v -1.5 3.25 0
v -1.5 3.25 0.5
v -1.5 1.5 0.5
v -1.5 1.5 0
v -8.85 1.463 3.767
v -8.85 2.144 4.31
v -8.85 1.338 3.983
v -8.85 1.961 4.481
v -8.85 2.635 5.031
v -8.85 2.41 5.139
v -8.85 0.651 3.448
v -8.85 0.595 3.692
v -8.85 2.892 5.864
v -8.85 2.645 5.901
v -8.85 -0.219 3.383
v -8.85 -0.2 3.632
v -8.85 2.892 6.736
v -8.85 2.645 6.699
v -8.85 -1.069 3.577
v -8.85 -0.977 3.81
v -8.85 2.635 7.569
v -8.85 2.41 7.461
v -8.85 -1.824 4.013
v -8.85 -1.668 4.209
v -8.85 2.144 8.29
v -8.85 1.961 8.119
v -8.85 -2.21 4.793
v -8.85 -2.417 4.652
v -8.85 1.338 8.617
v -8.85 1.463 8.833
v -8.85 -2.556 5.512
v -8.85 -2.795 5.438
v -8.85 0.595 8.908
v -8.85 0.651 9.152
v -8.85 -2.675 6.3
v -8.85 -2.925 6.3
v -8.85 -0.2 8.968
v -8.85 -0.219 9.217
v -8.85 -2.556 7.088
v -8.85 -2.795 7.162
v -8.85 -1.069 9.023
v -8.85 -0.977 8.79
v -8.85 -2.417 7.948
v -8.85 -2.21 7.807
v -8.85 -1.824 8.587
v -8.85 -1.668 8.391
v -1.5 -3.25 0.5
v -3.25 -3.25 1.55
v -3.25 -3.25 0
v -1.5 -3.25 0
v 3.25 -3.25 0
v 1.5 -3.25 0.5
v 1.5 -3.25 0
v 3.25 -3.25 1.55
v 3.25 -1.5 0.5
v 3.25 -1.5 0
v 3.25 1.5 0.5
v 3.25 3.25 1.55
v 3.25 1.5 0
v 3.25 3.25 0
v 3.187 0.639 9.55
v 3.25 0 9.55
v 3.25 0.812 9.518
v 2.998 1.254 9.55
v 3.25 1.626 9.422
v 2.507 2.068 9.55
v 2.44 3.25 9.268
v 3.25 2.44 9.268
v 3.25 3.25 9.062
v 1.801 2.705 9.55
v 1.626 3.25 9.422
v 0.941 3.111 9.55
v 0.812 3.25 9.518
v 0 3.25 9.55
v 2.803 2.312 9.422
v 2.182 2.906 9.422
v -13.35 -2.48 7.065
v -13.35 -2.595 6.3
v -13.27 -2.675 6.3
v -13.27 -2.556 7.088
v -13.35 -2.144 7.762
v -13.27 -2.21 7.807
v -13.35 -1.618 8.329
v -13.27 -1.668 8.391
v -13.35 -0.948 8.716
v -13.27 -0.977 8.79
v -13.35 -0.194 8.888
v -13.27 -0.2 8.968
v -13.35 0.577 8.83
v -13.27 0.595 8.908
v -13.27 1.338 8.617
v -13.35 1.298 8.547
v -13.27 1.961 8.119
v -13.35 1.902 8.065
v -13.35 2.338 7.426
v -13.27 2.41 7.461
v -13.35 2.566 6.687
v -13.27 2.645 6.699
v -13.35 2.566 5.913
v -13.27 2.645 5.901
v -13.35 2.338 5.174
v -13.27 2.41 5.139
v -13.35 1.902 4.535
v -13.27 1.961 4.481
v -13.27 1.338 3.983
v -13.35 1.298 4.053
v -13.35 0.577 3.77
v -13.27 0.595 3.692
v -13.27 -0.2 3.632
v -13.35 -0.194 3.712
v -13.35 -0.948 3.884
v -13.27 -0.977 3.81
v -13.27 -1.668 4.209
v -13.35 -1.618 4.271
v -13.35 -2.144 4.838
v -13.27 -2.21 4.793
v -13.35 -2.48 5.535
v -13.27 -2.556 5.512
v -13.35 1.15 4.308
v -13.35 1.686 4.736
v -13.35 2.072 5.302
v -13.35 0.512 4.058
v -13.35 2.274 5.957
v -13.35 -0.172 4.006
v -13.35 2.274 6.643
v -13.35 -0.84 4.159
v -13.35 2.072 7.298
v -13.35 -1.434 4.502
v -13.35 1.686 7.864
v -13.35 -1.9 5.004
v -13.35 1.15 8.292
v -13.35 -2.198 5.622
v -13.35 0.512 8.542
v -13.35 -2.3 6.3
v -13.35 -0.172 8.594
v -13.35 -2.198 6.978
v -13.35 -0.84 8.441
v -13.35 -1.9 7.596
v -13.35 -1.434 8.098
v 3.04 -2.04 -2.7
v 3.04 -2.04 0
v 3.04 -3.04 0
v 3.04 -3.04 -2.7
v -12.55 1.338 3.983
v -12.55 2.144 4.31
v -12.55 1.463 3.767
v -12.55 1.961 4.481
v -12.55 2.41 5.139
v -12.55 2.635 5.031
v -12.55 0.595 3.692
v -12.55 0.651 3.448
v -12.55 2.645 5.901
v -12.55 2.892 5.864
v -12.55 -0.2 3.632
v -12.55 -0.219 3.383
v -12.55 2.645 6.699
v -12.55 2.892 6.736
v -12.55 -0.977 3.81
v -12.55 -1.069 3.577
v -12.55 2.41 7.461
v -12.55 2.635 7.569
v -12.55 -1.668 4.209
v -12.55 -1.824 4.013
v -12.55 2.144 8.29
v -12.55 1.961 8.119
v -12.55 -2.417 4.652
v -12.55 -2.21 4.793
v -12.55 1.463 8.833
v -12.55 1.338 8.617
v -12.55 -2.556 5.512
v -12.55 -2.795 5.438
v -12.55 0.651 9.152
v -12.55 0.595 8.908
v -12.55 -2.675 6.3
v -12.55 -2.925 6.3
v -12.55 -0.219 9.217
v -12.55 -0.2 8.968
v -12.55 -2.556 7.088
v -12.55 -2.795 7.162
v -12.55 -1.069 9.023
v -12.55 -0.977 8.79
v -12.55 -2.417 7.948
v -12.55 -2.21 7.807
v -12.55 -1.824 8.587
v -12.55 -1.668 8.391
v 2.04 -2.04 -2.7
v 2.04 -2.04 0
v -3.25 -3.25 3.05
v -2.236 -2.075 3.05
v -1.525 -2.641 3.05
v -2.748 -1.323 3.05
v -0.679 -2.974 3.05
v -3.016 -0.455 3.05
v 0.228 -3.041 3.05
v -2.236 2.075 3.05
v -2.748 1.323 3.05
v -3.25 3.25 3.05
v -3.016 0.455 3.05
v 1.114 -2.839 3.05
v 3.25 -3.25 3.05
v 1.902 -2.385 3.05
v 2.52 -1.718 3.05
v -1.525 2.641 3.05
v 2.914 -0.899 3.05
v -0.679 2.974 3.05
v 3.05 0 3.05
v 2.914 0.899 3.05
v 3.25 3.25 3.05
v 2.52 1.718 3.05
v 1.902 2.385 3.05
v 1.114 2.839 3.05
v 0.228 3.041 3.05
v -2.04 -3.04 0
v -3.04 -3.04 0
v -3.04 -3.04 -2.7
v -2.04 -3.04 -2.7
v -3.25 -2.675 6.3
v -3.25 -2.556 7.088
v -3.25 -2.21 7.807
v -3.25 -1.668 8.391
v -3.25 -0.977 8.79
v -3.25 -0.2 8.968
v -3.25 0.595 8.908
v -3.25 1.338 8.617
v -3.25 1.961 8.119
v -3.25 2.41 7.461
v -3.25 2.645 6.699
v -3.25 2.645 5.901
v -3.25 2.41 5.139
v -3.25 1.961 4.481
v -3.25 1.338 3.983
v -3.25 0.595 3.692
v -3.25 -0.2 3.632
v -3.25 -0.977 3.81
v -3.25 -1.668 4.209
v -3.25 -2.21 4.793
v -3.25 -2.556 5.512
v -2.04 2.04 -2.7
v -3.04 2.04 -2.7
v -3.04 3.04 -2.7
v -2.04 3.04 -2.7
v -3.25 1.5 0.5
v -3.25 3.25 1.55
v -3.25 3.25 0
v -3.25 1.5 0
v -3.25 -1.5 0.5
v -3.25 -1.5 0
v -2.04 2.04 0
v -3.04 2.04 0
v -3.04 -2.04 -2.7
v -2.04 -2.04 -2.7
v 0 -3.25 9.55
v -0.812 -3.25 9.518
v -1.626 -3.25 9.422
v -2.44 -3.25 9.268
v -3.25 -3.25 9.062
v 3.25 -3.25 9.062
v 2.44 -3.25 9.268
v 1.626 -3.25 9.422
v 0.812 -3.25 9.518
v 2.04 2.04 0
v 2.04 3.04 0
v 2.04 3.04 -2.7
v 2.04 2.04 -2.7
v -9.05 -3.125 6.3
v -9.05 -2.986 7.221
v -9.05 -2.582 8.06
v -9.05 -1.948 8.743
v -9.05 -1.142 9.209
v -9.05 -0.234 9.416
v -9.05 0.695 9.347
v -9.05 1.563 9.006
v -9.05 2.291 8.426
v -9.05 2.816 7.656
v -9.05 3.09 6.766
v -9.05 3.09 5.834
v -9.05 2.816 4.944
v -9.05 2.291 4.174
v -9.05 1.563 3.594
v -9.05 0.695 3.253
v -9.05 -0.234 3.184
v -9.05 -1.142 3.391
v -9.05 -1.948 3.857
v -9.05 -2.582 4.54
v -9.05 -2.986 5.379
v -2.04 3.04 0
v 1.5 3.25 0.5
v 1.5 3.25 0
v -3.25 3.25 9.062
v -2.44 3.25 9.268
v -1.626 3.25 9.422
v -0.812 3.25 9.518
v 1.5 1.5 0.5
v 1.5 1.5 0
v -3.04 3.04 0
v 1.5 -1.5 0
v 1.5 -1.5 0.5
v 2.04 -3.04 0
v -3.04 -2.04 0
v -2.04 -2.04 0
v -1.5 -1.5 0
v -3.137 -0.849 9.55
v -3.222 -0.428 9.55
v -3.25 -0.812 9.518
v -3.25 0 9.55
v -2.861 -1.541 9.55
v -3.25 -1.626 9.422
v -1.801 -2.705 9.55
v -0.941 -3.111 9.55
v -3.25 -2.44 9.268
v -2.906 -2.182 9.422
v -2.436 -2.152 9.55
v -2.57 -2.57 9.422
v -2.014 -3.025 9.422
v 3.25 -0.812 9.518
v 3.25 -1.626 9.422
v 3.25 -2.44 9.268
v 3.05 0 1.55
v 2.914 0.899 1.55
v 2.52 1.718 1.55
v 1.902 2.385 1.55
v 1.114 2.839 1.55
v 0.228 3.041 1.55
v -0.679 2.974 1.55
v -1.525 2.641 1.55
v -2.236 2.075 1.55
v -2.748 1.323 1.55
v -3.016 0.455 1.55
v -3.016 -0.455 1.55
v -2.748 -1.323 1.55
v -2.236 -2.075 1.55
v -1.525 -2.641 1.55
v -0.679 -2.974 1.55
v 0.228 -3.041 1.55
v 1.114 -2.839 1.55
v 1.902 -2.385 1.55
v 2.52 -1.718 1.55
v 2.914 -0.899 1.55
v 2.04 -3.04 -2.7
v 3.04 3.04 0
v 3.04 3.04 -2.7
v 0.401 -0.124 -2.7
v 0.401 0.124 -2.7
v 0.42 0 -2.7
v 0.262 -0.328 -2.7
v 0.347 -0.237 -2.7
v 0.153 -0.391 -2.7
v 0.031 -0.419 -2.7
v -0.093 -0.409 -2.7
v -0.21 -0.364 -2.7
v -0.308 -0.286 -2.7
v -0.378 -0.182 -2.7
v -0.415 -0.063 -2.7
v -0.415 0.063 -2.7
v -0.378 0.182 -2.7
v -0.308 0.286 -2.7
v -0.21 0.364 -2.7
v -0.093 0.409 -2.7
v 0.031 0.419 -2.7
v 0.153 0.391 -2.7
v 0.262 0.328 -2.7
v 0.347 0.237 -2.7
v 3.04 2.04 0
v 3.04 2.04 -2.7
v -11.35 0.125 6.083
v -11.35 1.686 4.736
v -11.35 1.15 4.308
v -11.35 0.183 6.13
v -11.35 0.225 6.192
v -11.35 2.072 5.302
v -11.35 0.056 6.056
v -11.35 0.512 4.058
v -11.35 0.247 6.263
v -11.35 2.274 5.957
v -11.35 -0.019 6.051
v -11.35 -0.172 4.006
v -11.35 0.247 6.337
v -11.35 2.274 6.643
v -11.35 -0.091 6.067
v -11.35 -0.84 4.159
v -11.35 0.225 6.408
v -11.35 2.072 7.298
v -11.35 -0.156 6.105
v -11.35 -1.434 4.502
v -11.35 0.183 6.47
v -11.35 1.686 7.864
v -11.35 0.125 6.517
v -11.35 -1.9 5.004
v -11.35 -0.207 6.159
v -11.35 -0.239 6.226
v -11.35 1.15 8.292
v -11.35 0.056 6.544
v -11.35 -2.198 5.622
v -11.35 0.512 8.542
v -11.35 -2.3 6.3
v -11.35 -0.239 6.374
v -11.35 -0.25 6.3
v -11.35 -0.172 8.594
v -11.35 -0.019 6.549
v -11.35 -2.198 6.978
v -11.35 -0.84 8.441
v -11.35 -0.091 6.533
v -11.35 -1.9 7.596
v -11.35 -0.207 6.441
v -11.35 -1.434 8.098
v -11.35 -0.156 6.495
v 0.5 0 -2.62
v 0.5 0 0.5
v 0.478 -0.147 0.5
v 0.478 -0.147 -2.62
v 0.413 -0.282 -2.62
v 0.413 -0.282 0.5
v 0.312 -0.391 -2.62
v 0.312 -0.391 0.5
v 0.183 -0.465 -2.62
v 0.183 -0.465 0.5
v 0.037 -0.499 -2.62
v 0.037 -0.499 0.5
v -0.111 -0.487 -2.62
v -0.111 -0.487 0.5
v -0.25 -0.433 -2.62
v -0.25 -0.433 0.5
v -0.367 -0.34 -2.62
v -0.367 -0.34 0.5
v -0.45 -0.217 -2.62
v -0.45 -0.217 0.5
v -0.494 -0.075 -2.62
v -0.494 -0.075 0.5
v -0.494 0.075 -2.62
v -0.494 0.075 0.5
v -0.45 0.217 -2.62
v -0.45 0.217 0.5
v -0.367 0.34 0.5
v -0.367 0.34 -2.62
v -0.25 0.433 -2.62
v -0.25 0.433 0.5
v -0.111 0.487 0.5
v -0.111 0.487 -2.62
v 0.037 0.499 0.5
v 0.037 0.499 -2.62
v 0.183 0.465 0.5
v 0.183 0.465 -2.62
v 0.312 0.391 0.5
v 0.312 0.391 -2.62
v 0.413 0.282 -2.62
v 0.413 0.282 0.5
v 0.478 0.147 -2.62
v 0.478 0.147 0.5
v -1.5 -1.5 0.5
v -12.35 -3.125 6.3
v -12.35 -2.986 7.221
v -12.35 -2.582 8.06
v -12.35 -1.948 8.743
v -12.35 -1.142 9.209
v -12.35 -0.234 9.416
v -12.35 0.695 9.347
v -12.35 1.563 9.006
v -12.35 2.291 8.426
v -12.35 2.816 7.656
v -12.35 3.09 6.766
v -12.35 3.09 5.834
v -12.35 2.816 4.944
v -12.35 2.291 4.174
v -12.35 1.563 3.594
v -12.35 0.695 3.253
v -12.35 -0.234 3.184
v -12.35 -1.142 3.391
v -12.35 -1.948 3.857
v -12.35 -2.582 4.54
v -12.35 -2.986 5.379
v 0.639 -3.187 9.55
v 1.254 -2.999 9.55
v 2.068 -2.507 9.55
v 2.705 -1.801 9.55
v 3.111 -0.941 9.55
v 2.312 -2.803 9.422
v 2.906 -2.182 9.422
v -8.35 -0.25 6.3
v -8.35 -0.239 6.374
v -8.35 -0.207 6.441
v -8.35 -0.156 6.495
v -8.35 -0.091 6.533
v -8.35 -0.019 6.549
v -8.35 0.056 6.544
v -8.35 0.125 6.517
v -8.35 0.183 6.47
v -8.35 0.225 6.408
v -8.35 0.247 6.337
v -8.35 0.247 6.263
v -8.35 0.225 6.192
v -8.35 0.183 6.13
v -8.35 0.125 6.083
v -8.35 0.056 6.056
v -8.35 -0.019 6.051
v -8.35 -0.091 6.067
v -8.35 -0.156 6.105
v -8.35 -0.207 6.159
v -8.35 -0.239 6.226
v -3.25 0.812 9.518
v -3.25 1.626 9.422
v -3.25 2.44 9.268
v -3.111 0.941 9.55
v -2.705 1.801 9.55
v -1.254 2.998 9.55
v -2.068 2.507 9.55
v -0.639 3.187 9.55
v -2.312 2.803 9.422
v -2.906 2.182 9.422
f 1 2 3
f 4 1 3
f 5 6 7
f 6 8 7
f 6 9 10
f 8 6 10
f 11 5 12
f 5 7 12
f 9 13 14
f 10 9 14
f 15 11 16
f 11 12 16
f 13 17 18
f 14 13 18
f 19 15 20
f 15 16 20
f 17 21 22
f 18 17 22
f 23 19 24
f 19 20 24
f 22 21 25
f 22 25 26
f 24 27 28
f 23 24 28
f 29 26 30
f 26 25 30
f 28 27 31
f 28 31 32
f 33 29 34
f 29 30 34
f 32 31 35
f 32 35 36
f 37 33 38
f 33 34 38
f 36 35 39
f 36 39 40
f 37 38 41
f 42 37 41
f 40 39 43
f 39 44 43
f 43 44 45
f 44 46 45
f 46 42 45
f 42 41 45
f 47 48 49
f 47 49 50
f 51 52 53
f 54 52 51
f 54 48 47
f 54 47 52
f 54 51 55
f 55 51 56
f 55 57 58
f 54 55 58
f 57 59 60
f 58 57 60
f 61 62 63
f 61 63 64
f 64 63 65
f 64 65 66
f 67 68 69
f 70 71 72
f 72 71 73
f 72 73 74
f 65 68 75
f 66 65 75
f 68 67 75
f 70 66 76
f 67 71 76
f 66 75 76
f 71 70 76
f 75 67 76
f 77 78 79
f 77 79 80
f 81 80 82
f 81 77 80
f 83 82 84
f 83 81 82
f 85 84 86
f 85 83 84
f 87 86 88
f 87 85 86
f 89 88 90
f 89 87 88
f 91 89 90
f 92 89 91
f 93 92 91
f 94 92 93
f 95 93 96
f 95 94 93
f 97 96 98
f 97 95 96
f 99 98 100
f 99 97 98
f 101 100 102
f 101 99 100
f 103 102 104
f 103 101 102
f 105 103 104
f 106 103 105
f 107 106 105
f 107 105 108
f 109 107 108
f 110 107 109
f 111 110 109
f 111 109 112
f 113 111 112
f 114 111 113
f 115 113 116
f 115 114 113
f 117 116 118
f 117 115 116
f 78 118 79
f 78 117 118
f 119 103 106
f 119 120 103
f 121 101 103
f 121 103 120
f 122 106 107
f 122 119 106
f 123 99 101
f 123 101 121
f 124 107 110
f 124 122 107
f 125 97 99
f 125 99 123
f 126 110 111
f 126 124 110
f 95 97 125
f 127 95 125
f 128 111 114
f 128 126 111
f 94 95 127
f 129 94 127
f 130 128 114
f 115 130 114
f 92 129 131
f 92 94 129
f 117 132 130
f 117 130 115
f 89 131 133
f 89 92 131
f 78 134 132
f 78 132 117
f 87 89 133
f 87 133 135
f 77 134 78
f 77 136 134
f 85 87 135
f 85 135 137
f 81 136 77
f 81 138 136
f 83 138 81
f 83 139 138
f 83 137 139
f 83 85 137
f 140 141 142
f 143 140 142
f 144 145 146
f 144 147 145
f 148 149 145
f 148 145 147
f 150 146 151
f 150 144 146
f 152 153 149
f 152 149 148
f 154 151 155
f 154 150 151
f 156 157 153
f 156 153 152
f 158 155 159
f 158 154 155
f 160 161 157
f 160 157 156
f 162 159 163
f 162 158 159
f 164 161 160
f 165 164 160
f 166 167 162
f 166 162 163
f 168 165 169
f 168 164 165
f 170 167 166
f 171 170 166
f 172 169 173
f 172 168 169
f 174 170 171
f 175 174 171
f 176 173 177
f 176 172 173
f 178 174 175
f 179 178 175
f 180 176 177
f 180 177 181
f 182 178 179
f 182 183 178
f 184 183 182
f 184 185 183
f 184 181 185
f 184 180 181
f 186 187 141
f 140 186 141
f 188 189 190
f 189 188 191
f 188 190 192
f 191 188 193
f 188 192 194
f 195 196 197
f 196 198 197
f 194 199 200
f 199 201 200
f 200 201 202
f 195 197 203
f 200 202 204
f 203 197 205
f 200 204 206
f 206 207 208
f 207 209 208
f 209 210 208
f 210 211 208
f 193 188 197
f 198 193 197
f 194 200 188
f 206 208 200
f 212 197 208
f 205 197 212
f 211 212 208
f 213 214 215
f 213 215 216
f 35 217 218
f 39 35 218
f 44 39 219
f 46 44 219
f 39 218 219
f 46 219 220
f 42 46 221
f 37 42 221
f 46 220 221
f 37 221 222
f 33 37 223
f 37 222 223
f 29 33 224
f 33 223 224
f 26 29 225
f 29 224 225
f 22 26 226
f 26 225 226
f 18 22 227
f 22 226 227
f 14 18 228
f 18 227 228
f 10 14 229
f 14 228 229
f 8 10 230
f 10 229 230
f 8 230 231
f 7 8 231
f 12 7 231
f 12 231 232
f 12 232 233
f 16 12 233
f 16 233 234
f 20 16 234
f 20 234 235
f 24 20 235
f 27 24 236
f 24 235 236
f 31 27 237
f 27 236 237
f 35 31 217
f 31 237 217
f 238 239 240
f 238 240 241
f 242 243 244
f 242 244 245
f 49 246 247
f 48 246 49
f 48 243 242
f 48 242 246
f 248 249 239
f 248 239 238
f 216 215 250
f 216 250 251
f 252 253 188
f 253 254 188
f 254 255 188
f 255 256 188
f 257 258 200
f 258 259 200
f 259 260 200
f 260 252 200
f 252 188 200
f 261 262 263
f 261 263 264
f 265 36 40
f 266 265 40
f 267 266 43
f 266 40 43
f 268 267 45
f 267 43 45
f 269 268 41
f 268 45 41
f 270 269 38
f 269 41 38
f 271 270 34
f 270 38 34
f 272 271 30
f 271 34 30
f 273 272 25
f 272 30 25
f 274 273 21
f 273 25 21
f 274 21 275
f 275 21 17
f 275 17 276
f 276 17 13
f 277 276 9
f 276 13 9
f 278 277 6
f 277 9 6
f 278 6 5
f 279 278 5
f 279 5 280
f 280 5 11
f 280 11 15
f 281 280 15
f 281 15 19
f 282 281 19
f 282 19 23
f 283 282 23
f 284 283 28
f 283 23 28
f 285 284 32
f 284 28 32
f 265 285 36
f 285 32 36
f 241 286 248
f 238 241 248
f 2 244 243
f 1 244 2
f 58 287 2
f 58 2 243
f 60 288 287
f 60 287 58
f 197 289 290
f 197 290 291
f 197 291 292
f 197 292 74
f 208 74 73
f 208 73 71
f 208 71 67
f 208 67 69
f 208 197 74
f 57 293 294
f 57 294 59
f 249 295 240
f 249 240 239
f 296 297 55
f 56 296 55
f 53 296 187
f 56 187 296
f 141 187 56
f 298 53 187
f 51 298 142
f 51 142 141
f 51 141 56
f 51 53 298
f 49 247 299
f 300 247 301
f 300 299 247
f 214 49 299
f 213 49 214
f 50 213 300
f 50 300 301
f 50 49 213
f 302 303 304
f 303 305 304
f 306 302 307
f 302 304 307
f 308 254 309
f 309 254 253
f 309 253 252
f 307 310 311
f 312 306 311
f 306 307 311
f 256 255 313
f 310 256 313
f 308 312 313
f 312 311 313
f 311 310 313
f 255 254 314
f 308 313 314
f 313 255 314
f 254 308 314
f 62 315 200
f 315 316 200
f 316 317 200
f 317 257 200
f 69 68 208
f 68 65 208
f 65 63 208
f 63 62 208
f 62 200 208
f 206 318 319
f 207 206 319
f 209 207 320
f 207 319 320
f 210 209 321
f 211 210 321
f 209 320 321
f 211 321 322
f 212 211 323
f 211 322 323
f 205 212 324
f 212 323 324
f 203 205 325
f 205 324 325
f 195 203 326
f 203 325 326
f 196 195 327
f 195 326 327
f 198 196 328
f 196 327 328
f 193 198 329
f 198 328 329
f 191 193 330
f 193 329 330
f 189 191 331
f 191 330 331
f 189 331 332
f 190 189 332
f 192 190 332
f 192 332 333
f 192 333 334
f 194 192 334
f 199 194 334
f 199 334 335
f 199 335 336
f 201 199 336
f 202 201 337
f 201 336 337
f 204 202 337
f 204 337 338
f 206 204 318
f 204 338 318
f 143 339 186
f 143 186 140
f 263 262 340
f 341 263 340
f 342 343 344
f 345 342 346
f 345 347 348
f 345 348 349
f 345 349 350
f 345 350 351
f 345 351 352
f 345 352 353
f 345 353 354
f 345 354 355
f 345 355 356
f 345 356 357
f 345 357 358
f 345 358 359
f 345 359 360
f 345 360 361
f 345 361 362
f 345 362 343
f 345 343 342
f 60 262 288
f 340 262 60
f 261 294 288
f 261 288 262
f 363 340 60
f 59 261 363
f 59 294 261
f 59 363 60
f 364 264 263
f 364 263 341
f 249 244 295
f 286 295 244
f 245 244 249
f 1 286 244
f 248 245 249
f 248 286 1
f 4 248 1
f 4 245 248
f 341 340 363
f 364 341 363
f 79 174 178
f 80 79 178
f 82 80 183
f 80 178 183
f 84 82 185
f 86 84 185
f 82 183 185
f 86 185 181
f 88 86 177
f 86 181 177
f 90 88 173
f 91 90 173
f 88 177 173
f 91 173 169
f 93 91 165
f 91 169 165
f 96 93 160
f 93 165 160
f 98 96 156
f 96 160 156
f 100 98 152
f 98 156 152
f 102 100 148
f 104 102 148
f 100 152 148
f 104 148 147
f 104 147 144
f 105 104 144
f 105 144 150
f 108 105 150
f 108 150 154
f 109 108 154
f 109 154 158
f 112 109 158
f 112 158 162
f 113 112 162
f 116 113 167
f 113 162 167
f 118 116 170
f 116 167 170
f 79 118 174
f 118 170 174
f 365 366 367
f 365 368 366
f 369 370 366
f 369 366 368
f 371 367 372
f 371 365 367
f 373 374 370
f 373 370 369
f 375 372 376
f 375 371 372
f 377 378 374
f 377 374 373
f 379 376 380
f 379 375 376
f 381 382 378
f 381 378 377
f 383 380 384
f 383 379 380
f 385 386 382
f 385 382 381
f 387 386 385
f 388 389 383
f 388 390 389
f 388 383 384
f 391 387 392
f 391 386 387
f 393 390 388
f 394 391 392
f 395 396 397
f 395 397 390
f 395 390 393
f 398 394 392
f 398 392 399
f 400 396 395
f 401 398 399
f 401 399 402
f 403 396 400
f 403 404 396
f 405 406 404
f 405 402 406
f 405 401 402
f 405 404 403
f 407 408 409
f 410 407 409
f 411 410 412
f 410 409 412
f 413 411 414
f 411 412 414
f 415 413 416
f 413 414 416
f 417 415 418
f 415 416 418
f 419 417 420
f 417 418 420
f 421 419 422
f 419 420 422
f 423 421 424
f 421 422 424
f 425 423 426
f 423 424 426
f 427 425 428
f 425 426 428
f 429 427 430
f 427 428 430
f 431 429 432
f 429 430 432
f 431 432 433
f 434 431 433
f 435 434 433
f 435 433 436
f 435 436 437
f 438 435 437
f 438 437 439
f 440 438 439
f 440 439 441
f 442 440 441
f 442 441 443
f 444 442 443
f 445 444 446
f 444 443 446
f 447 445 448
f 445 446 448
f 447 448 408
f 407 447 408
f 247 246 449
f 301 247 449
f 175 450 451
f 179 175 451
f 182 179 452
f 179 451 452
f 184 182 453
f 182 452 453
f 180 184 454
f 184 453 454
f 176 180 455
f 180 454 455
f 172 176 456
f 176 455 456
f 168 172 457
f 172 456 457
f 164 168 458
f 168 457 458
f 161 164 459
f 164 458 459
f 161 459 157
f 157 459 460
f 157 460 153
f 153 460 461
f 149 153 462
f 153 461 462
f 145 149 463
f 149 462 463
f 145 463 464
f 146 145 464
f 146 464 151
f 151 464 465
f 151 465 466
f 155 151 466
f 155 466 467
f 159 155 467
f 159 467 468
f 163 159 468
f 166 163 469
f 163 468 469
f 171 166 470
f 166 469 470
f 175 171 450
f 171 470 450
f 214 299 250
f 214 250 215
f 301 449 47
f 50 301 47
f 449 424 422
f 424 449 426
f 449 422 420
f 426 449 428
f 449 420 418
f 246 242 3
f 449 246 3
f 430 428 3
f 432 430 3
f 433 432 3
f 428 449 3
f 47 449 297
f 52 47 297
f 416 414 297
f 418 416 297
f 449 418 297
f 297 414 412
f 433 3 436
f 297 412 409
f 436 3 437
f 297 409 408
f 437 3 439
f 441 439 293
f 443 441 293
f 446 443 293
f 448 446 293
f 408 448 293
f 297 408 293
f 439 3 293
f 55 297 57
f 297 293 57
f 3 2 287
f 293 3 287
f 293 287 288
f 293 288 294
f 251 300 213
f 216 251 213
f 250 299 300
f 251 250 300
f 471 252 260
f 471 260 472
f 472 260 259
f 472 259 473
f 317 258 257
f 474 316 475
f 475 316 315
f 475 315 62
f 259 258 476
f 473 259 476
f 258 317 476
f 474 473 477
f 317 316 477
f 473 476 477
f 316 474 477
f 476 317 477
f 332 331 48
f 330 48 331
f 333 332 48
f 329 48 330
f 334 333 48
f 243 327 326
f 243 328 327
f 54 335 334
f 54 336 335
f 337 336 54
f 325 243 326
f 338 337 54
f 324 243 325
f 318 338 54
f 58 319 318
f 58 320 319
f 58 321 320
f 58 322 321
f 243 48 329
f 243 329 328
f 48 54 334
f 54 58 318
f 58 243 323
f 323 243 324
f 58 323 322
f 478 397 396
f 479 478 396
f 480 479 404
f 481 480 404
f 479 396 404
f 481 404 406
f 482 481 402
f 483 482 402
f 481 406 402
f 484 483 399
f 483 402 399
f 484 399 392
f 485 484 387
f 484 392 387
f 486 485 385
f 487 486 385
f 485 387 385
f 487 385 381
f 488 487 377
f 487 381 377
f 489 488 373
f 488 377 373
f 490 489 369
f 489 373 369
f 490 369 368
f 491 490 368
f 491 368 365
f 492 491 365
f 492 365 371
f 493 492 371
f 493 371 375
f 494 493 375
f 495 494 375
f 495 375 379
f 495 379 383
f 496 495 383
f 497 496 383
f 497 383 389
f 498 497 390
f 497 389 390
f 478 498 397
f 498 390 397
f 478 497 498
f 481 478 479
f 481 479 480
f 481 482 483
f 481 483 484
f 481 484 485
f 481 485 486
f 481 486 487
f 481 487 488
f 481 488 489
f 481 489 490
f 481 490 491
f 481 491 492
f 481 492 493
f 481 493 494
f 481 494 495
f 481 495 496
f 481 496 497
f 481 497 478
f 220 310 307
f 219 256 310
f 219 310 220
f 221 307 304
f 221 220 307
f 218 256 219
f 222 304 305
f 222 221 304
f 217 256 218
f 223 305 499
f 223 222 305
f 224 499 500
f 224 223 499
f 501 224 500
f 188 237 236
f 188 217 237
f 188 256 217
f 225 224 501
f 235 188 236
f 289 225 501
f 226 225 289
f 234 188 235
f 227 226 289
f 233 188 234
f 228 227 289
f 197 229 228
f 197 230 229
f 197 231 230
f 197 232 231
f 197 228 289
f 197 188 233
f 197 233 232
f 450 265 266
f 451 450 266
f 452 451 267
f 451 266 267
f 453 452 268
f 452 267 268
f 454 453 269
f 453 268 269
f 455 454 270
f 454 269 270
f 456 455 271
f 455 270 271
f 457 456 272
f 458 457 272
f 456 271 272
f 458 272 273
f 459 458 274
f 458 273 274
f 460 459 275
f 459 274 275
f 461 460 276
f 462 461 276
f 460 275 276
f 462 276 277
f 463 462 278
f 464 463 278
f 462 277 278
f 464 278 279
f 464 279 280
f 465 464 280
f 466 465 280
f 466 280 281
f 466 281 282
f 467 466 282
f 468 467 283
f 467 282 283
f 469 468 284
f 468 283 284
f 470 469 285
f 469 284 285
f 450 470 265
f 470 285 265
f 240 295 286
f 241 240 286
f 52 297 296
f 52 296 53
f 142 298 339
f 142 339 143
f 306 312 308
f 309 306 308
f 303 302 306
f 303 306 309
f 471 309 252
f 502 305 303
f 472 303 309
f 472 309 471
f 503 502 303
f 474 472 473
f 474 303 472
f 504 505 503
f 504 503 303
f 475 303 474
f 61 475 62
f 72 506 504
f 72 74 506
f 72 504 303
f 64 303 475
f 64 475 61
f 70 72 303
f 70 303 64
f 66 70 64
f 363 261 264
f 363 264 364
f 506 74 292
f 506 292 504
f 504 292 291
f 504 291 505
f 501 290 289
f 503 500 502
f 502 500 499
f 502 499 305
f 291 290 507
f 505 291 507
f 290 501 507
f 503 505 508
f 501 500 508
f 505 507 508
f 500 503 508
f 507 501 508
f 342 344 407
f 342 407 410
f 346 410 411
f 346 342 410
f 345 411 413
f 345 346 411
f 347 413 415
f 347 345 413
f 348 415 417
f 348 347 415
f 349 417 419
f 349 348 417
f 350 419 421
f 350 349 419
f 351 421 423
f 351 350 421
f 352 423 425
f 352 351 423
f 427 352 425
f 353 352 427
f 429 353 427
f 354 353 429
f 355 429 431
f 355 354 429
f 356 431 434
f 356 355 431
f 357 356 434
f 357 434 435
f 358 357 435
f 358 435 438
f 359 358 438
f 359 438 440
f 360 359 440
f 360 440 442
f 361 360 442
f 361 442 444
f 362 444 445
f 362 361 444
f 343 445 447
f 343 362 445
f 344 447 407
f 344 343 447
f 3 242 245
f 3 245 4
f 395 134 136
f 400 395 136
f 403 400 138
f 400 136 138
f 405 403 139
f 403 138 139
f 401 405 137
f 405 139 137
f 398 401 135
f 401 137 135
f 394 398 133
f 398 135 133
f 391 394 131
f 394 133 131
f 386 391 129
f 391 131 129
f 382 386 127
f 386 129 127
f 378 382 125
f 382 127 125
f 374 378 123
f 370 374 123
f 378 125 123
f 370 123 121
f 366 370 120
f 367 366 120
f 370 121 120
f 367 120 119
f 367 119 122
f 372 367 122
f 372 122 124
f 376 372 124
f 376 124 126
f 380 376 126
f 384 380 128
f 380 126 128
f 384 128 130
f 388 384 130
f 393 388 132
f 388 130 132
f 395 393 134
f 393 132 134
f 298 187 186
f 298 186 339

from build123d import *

# Parameters (mm, degrees)
SKETCH_W        = 6.5
SKETCH_H        = 6.5
PAD_DEPTH       = 1.05
SKETCH001_W     = 1.75
SKETCH001_H     = 1.75
PAD001_DEPTH    = 0.5
SKETCH002_W     = 1
SKETCH002_H     = 1
PAD002_DEPTH    = 2.7
SKETCH003_R     = 0.5
PAD003_DEPTH    = 3.2
CHAMFER_SIZE    = 0.08
SKETCH004_R     = 3.05
PAD004_DEPTH    = 1.5
SKETCH005_W     = 6.5
SKETCH005_H     = 6.5
PAD005_DEPTH    = 6.5
SKETCH006_R     = 2.675
PAD006_DEPTH    = 5.6
SKETCH007_R     = 3.125
PAD007_DEPTH    = 3.7
SKETCH008_R     = 2.675
PAD008_DEPTH    = 0.8
CHAMFER001_SIZE = 0.08
CHAMFER002_SIZE = 0.2
SKETCH009_R     = 2.3
POCKET_DEPTH    = 2
SKETCH010_R     = 0.25
POCKET001_DEPTH = 3


with BuildPart() as part:
    # Sketch → Pad (new body)
    with BuildSketch(Plane.XY.offset(0.5)):
        Rectangle(SKETCH_W, SKETCH_H)
    extrude(amount=PAD_DEPTH)

    # Sketch001 (on Face5 of Pad) → Pad001 (join)
    with BuildSketch(Plane(origin=(0, 0, 0.5), x_dir=(1, 0, 0), z_dir=(0, 0, -1))):
        with Locations((-2.375, 2.375)):
            Rectangle(SKETCH001_W, SKETCH001_H)
        with Locations((-2.375, -2.375)):
            Rectangle(SKETCH001_W, SKETCH001_H)
        with Locations((2.375, -2.375)):
            Rectangle(SKETCH001_W, SKETCH001_H)
        with Locations((2.375, 2.375)):
            Rectangle(SKETCH001_W, SKETCH001_H)
    extrude(amount=PAD001_DEPTH)

    # Sketch002 (on Face26 of Pad001) → Pad002 (join)
    with BuildSketch(Plane(origin=(0, 0, 0), x_dir=(1, 0, 0), z_dir=(0, 0, -1))):
        with Locations((-2.54, 2.54)):
            Rectangle(SKETCH002_W, SKETCH002_H)
        with Locations((2.54, 2.54)):
            Rectangle(SKETCH002_W, SKETCH002_H)
        with Locations((2.54, -2.54)):
            Rectangle(SKETCH002_W, SKETCH002_H)
        with Locations((-2.54, -2.54)):
            Rectangle(SKETCH002_W, SKETCH002_H)
    extrude(amount=PAD002_DEPTH)

    # Sketch003 (on Face5 of Pad002) → Pad003 (join)
    with BuildSketch(Plane(origin=(0, 0, 0.5), x_dir=(1, 0, 0), z_dir=(0, 0, -1))):
        Circle(SKETCH003_R)
    extrude(amount=PAD003_DEPTH)

    # Chamfer
    chamfer_edges = [part.edges().sort_by_distance(p)[0] for p in [
        (-0.5, 0, -2.7),
    ]]
    chamfer(chamfer_edges, length=CHAMFER_SIZE)

    # Sketch004 (on Face20 of Chamfer) → Pad004 (join)
    with BuildSketch(Plane.XY.offset(1.55)):
        Circle(SKETCH004_R)
    extrude(amount=PAD004_DEPTH)

    # Sketch005 (on Face48 of Pad004) → Pad005 (join)
    with BuildSketch(Plane.XY.offset(3.05)):
        Rectangle(SKETCH005_W, SKETCH005_H)
    extrude(amount=PAD005_DEPTH)

    # Sketch006 (on Face2 of Pad005) → Pad006 (join)
    with BuildSketch(Plane(origin=(-3.25, 0, 0), x_dir=(0, -1, 0), z_dir=(-1, 0, 0))):
        with Locations((0, 6.3)):
            Circle(SKETCH006_R)
    extrude(amount=PAD006_DEPTH)

    # Sketch007 (on Face9 of Pad006) → Pad007 (join)
    with BuildSketch(Plane(origin=(-8.85, 0, 0), x_dir=(0, -1, 0), z_dir=(-1, 0, 0))):
        with Locations((0, 6.3)):
            Circle(SKETCH007_R)
    extrude(amount=PAD007_DEPTH)

    # Sketch008 (on Face3 of Pad007) → Pad008 (join)
    with BuildSketch(Plane(origin=(-12.55, 0, 0), x_dir=(0, -1, 0), z_dir=(-1, 0, 0))):
        with Locations((0, 6.3)):
            Circle(SKETCH008_R)
    extrude(amount=PAD008_DEPTH)

    # Chamfer001
    chamfer001_edges = [part.edges().sort_by_distance(p)[0] for p in [
        (-13.35, 2.675, 6.3),
    ]]
    chamfer(chamfer001_edges, length=CHAMFER001_SIZE)

    # Chamfer002
    chamfer002_edges = [part.edges().sort_by_distance(p)[0] for p in [
        (-8.85, 3.125, 6.3),
        (-12.55, 3.125, 6.3),
    ]]
    chamfer(chamfer002_edges, length=CHAMFER002_SIZE)

    # Sketch009 (on Face7 of Chamfer002) → Pocket (cut)
    with BuildSketch(Plane(origin=(-13.35, 0, 0), x_dir=(0, -1, 0), z_dir=(-1, 0, 0))):
        with Locations((0, 6.3)):
            Circle(SKETCH009_R)
    extrude(amount=-POCKET_DEPTH, mode=Mode.SUBTRACT)

    # Sketch010 (on Face11 of Pocket) → Pocket001 (cut)
    with BuildSketch(Plane(origin=(-11.35, 0, 0), x_dir=(0, -1, 0), z_dir=(-1, 0, 0))):
        with Locations((0, 6.3)):
            Circle(SKETCH010_R)
    extrude(amount=-POCKET001_DEPTH, mode=Mode.SUBTRACT)

    # Sketch011 → Groove (revolve, cut)
    with BuildSketch(Plane.XZ):
        with BuildLine():
            ThreePointArc((0, 10.289421), (-2.380676, 9.806619), (-4.681284, 9.026929))
            Line((-4.681284, 9.026929), (-4.681284, 13.840189))
            Line((-4.681284, 13.840189), (0, 13.840189))
            Line((0, 13.840189), (0, 10.289421))
        make_face()
    revolve(axis=Axis((0, 0, 0), (0, 0, 1)), mode=Mode.SUBTRACT)


solid = part.part
